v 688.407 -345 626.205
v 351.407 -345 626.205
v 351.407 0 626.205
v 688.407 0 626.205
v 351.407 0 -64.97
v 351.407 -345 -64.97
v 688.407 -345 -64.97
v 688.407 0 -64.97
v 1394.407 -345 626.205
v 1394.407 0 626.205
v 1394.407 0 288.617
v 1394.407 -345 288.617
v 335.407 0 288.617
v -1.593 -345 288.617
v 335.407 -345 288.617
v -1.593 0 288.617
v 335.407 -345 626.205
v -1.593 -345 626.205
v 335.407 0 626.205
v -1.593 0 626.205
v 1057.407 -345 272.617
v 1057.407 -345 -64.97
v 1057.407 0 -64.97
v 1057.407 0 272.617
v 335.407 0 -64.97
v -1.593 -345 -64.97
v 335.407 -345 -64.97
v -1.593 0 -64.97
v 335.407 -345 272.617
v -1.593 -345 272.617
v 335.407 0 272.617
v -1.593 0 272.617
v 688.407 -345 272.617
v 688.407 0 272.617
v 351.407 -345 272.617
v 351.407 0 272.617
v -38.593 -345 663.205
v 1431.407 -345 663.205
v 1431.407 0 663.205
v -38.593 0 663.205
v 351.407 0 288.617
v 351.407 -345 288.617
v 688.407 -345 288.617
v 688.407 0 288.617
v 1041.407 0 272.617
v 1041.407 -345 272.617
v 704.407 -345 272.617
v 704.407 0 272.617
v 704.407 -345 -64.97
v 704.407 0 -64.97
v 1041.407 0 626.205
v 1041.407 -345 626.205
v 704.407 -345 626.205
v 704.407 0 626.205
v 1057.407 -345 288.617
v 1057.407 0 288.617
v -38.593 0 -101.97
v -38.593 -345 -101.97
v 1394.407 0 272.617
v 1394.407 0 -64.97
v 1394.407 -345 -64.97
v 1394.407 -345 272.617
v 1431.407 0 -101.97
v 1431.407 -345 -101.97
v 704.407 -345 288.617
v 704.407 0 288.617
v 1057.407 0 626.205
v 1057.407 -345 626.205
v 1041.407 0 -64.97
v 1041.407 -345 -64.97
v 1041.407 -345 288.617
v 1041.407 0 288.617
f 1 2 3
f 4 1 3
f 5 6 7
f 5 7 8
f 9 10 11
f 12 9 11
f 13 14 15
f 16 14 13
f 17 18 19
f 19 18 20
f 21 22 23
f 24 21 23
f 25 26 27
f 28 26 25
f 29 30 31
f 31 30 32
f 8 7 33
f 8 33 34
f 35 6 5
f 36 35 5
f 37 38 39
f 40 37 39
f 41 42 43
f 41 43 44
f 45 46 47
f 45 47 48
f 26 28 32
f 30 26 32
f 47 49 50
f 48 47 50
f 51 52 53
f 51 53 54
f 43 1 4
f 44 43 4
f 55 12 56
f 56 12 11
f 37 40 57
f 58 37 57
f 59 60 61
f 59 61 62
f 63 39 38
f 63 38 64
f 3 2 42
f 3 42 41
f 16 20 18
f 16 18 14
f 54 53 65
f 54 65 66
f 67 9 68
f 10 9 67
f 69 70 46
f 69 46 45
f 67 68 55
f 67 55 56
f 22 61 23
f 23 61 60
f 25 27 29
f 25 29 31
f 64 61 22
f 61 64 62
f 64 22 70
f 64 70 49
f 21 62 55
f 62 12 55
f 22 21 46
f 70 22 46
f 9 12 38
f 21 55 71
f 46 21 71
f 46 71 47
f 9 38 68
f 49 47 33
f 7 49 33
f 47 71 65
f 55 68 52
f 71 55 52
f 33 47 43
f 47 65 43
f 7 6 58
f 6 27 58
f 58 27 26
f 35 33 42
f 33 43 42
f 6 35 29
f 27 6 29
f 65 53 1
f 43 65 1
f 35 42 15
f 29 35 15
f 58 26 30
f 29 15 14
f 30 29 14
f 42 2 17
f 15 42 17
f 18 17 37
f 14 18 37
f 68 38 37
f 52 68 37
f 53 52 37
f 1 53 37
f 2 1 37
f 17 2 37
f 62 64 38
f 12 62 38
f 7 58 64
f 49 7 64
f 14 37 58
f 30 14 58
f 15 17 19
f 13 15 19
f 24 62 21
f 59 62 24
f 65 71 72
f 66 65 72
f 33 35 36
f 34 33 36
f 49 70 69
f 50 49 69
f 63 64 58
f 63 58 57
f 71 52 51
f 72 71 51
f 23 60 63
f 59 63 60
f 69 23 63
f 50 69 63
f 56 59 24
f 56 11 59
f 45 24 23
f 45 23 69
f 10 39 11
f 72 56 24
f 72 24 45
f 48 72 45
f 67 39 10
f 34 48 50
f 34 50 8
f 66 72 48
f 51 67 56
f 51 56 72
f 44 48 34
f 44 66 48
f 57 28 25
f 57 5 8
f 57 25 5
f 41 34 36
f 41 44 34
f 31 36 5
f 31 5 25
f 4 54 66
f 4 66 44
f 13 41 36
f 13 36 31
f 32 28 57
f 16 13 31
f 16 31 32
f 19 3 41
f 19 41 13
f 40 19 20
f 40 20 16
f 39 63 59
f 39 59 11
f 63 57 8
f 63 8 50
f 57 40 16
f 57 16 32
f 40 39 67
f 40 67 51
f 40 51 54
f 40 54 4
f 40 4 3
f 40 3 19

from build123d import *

# Parameters (mm, degrees)
F0_W     = 37
F0_H     = 382.5875
F1_DEPTH = 345
F2_W     = 345
F2_H     = 37
F3_DEPTH = 698
F7_W     = 345
F7_H     = 8
F8_DEPTH = 698
F4_W     = 16
F4_H     = 345
F4_W_2   = 8
F5_DEPTH = 337.5875


with BuildPart() as f1:
    # F0 (on Front) → F1 (new body)
    with BuildSketch(Plane.XZ):
        with Locations((-20.093406, 89.323638)):
            Rectangle(F0_W, F0_H)
    extrude(amount=F1_DEPTH)

    # F2 (on face) → F3 (join)
    with BuildSketch(Plane.YZ.offset(-1.593406)):
        with Locations((-172.5, -83.470112)):
            Rectangle(F2_W, F2_H)
    extrude(amount=F3_DEPTH)

    # F7 (on face) → F8 (join)
    with BuildSketch(Plane.YZ.offset(-1.593406)):
        with Locations((-172.5, 276.617388)):
            Rectangle(F7_W, F7_H)
    extrude(amount=F8_DEPTH)

    # F4 (on face) → F5 (join, through all)
    with BuildSketch(Plane.XY.offset(-64.970112)):
        with Locations((343.406594, -172.5)):
            Rectangle(F4_W, F4_H)
        with Locations((692.406594, -172.5)):
            Rectangle(F4_W_2, F4_H)
    extrude(amount=F5_DEPTH)

    # F9: F1 across face


with BuildPart() as f1_1:
    add(f1.part)
    add(f1.part.mirror(Plane(origin=(328.906594, -172.5, 280.617388), x_dir=(1, 0, 0), z_dir=(0, 0, 1))))

    # F6: F1 across face


with BuildPart() as f1_2:
    add(f1_1.part)
    add(f1_1.part.mirror(Plane(origin=(696.406594, -172.5, 280.617388), x_dir=(0, 1, 0), z_dir=(1, 0, 0))))


solid = f1_2.part
